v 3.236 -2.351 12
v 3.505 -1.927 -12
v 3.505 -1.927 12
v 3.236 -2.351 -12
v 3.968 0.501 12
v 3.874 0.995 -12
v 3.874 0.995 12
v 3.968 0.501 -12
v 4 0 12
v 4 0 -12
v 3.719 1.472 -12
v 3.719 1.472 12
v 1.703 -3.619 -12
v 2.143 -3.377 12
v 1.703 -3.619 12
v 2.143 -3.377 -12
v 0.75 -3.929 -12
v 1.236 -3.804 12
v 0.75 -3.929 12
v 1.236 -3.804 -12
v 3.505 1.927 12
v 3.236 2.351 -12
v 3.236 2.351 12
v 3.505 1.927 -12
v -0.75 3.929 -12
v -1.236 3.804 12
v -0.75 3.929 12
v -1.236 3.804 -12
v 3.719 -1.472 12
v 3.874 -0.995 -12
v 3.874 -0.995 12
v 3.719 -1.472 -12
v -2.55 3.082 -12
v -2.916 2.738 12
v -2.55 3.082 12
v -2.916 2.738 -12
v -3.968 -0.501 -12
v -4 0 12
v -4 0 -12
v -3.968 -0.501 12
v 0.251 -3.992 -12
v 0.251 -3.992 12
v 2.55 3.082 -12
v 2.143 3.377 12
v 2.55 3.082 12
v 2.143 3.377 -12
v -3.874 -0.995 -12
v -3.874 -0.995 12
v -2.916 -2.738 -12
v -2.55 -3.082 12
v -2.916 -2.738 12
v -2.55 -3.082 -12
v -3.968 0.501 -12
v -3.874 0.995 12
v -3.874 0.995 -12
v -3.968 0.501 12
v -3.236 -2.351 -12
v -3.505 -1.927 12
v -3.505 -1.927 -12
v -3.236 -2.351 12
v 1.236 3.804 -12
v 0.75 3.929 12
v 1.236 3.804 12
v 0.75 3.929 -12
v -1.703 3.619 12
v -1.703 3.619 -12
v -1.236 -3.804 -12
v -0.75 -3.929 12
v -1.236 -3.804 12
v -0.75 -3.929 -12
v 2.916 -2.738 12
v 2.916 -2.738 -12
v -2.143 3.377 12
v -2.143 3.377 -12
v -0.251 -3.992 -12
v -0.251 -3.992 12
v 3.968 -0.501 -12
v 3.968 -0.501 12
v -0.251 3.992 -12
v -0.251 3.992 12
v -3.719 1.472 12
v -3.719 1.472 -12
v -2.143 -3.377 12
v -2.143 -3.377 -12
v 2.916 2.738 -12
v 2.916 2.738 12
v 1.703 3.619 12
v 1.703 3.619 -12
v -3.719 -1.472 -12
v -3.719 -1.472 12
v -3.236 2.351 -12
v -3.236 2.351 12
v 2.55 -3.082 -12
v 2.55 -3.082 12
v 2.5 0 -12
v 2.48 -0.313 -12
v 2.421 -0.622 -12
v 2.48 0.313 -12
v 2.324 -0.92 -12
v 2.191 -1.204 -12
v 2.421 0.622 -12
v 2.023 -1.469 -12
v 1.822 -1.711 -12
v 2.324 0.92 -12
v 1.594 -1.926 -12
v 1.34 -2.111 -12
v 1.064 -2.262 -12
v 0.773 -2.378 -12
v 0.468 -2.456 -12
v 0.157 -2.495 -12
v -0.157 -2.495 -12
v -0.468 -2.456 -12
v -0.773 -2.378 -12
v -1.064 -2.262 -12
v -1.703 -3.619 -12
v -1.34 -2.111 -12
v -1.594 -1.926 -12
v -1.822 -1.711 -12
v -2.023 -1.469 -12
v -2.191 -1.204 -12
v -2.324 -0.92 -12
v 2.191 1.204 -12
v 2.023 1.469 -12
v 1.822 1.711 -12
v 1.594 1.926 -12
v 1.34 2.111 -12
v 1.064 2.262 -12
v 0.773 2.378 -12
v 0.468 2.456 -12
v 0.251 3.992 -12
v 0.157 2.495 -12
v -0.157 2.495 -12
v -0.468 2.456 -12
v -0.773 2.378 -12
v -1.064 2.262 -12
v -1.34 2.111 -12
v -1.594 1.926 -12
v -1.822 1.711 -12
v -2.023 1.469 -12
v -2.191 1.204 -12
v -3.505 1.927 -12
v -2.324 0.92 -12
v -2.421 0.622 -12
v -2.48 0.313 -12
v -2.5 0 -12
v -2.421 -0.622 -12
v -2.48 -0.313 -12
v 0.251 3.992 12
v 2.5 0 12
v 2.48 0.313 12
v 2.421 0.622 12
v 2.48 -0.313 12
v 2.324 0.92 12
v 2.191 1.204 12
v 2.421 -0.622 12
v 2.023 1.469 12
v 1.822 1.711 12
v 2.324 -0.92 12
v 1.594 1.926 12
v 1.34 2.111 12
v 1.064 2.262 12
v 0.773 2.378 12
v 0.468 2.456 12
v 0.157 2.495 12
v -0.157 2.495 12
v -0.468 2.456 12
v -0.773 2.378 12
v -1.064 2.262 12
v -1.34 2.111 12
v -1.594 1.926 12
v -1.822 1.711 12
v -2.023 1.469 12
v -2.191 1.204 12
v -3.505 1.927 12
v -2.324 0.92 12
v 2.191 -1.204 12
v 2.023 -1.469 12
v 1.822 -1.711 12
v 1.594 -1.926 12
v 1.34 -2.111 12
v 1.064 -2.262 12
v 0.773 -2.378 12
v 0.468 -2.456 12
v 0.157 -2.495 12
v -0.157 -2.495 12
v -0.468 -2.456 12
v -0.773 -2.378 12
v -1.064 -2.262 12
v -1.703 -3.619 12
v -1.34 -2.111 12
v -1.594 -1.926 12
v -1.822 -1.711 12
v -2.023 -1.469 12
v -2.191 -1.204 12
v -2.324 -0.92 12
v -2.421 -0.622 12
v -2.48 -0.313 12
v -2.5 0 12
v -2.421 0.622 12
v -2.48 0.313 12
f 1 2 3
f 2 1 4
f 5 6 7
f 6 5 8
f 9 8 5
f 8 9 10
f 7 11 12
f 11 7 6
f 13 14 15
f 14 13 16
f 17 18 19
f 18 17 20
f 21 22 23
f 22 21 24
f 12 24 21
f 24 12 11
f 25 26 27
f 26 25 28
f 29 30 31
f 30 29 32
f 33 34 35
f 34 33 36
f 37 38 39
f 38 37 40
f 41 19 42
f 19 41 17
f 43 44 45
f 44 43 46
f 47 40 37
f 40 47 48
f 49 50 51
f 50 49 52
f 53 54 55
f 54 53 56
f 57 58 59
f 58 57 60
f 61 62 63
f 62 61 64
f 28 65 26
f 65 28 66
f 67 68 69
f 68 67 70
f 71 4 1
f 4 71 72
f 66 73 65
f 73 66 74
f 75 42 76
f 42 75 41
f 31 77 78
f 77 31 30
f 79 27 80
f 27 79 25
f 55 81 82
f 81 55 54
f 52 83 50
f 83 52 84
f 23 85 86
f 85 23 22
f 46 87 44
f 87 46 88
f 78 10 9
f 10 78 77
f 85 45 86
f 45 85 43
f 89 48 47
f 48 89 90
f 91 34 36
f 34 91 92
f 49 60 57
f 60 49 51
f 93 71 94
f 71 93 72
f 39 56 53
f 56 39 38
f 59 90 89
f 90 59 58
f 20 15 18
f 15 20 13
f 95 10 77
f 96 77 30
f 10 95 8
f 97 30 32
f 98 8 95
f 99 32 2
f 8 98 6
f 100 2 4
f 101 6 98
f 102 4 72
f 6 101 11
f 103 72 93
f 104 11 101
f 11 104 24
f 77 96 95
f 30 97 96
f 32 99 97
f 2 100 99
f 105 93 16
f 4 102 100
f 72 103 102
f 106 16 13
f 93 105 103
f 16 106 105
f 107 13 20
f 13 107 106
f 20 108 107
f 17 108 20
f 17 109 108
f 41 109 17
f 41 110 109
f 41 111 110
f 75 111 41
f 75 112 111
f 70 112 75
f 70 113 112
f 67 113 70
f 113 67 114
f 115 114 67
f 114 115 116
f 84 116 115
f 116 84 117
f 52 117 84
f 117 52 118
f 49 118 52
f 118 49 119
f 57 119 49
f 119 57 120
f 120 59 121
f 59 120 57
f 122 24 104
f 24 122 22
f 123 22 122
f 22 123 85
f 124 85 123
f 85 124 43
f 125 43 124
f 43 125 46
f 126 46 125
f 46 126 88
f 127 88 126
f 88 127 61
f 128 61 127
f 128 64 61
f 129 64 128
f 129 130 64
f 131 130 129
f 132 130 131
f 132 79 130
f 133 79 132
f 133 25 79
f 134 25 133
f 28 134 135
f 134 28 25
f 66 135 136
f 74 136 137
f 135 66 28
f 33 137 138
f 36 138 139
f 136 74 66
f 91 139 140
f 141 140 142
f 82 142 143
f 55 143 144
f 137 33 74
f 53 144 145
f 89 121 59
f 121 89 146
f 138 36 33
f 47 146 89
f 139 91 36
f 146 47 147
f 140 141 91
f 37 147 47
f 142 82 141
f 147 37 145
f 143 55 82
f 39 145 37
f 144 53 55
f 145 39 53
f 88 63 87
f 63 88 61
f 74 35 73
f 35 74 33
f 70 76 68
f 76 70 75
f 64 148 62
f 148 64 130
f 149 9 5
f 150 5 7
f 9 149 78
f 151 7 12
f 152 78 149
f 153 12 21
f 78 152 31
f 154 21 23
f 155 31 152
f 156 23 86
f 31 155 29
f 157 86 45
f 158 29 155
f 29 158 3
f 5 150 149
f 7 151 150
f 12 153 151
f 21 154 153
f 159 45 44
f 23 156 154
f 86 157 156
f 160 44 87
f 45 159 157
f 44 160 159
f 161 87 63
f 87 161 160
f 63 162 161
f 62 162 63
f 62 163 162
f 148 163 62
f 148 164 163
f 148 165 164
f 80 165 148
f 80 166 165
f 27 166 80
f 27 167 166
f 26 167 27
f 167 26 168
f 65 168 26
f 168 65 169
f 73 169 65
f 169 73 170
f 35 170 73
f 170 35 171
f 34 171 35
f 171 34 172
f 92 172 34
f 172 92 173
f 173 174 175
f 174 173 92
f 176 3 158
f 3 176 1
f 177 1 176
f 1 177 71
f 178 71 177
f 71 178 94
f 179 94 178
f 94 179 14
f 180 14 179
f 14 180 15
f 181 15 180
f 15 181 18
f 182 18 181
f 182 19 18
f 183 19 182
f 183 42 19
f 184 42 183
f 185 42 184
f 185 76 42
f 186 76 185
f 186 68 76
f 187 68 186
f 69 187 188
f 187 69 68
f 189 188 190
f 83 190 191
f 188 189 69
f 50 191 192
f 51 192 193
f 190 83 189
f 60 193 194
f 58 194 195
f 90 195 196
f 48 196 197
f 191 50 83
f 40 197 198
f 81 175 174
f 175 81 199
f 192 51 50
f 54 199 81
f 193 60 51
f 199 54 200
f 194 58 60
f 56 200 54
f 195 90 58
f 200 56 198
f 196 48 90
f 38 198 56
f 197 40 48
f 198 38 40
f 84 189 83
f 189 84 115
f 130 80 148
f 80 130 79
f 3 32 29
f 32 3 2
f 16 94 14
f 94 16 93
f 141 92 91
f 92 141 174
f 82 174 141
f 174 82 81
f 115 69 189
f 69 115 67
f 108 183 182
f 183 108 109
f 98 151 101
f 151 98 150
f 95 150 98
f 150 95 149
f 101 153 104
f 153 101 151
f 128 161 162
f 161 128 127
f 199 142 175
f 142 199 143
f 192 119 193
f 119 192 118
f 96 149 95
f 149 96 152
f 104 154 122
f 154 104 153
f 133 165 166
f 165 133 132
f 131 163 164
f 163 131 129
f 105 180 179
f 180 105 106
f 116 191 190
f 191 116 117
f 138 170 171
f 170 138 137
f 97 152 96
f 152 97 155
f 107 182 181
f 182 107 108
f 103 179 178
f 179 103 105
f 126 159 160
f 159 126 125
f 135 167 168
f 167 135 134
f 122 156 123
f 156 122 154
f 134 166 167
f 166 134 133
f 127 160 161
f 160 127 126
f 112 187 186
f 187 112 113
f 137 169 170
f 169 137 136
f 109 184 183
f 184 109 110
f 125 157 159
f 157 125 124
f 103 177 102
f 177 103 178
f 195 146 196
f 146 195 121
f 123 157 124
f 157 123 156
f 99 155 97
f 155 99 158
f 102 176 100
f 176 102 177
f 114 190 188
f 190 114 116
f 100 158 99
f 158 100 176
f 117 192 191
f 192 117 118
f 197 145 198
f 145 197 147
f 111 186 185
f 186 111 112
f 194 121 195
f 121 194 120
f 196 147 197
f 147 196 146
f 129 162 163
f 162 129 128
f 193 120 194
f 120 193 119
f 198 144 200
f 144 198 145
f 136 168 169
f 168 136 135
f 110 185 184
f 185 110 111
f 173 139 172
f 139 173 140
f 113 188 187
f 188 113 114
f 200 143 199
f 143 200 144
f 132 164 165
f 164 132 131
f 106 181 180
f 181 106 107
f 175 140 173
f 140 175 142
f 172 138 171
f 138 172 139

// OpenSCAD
$fn = 50;


difference() {
	union() {
		translate(v = [0, 0, -12.0000000000]) {
			cylinder(h = 24, r = 4.0000000000);
		}
	}
	union() {
		translate(v = [0, 0, -100.0000000000]) {
			cylinder(h = 200, r = 2.5000000000);
		}
	}
}
